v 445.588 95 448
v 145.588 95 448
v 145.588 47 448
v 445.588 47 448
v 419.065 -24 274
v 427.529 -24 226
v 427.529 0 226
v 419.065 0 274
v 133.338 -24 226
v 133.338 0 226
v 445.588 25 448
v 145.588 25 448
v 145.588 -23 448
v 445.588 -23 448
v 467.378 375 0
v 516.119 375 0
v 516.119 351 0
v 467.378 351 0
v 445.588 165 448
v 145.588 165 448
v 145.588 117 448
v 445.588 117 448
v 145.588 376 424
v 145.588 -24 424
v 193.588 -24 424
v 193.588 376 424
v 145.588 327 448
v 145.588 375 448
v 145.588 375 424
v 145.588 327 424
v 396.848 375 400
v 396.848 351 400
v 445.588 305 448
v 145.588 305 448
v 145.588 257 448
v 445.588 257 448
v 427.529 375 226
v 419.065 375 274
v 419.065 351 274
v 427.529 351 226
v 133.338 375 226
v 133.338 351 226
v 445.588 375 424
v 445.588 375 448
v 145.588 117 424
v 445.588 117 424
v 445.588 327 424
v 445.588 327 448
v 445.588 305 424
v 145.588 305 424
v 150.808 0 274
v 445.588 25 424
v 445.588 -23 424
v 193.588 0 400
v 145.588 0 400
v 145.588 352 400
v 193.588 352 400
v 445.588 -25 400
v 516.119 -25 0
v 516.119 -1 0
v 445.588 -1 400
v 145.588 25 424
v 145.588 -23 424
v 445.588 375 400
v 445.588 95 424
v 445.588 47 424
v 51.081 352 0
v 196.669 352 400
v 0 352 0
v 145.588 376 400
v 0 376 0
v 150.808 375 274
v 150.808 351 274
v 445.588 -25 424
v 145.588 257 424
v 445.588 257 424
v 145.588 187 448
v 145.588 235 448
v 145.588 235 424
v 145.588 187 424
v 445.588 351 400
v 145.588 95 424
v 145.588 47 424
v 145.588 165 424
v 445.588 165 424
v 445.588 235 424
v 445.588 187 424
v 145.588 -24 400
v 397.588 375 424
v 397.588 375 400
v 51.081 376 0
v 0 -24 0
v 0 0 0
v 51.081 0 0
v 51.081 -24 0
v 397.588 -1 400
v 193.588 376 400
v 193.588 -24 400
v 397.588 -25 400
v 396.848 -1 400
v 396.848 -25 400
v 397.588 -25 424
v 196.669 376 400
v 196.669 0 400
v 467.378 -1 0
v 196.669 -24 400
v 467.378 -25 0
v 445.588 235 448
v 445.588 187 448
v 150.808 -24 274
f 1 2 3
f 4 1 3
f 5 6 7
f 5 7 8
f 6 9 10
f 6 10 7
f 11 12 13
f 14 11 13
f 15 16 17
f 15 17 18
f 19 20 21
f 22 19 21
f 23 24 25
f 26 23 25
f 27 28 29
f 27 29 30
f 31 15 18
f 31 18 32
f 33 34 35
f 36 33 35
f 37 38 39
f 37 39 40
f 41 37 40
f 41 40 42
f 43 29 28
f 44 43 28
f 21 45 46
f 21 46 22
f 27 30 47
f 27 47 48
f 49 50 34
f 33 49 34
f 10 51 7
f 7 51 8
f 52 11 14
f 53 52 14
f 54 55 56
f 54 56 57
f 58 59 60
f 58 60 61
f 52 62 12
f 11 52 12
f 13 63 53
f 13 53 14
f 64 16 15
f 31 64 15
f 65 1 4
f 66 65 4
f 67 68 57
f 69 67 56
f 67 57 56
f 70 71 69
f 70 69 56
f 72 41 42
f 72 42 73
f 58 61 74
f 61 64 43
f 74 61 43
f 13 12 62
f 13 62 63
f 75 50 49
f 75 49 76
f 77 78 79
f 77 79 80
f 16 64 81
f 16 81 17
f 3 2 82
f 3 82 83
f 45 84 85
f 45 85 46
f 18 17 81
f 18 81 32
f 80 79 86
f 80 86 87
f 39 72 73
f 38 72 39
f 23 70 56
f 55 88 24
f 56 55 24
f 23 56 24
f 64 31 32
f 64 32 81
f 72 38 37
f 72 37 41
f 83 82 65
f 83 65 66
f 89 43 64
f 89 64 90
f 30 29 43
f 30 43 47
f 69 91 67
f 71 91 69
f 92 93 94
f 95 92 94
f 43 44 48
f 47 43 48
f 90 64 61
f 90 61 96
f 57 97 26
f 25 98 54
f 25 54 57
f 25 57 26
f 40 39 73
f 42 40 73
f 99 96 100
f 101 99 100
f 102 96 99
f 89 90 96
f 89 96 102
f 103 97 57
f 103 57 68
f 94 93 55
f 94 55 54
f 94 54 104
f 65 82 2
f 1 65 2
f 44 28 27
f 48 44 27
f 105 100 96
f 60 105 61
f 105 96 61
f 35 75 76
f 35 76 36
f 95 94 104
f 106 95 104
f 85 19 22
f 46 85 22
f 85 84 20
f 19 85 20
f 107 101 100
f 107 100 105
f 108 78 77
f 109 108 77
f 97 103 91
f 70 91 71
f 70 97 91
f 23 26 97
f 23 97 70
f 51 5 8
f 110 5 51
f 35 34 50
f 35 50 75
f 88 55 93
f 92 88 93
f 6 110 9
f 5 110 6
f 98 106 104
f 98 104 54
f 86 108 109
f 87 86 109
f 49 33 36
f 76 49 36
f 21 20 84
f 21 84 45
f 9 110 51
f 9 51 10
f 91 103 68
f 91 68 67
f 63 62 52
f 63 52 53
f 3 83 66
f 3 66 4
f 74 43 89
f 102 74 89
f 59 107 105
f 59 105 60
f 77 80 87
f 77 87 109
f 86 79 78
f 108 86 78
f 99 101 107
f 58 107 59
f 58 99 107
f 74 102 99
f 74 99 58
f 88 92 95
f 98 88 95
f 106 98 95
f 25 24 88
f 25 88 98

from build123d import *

# Parameters (mm, degrees)
F1_DEPTH  = 24
F2_W      = 48
F2_H      = 24
F3_DEPTH  = 400
F5_DEPTH  = 24
F6_W      = 48
F6_H      = 24
F7_DEPTH  = 300
F8_W      = 48
F8_H      = 24
F9_DEPTH  = 400
F11_DEPTH = 24
F13_DEPTH = 24
F15_DEPTH = 24
F17_DEPTH = 24


with BuildPart() as f1:
    # F0 (on Front) → F1 (new body)
    with BuildSketch(Plane.XZ):
        Polygon((145.588094, 400), (0, 0), (51.080533, 0), (196.668627, 400), align=None)
    extrude(amount=F1_DEPTH)

    # F2 (on face) → F3 (join)
    with BuildSketch(Plane.XZ.offset(24)):
        with Locations((169.588094, 412)):
            Rectangle(F2_W, F2_H)
    extrude(amount=-F3_DEPTH)

    # F4 (on face) → F5 (join)
    with BuildSketch(Plane(origin=(0, 376, 0), x_dir=(-1, 0, 0), z_dir=(0, 1, 0))):
        Polygon((-51.080533, 0), (0, 0), (-145.588094, 400), (-196.668627, 400), align=None)
    extrude(amount=-F5_DEPTH)


with BuildPart() as f7:
    # F6 (on face) → F7 (new body)
    with BuildSketch(Plane(origin=(145.588094, 0, 0), x_dir=(0, -1, 0), z_dir=(-1, 0, 0))):
        with Locations((-351, 436)):
            Rectangle(F6_W, F6_H)
        with Locations((-281, 436)):
            Rectangle(F6_W, F6_H)
        with Locations((-211, 436)):
            Rectangle(F6_W, F6_H)
        with Locations((-141, 436)):
            Rectangle(F6_W, F6_H)
        with Locations((-71, 436)):
            Rectangle(F6_W, F6_H)
        with Locations((-1, 436)):
            Rectangle(F6_W, F6_H)
    extrude(amount=-F7_DEPTH)


with BuildPart() as f9:
    # F8 (on face) → F9 (new body)
    with BuildSketch(Plane(origin=(0, 375, 0), x_dir=(-1, 0, 0), z_dir=(0, 1, 0))):
        with Locations((-421.588094, 412)):
            Rectangle(F8_W, F8_H)
    extrude(amount=-F9_DEPTH)

    # F12 (on face) → F13 (join)
    with BuildSketch(Plane.XZ.offset(25)):
        Polygon((516.118886, 0), (445.588094, 400), (396.847616, 400), (467.378409, 0), align=None)
    extrude(amount=-F13_DEPTH)


with BuildPart() as f11:
    # F10 (on face) → F11 (new body)
    with BuildSketch(Plane(origin=(0, 375, 0), x_dir=(-1, 0, 0), z_dir=(0, 1, 0))):
        Polygon((-396.847616, 400), (-445.588094, 400), (-516.118886, 0), (-467.378409, 0), align=None)
    extrude(amount=-F11_DEPTH)


with BuildPart() as f15:
    # F14 (on face) → F15 (new body)
    with BuildSketch(Plane.XZ.offset(24)):
        Polygon((133.337806, 226), (427.528511, 226), (419.064816, 274), (150.808377, 274), align=None)
    extrude(amount=-F15_DEPTH)


with BuildPart() as f17:
    # F16 (on face) → F17 (new body)
    with BuildSketch(Plane(origin=(0, 375, 0), x_dir=(-1, 0, 0), z_dir=(0, 1, 0))):
        Polygon((-133.337806, 226), (-150.808377, 274), (-419.064816, 274), (-427.528511, 226), align=None)
    extrude(amount=-F17_DEPTH)


solid = Compound([f1.part, f7.part, f9.part, f11.part, f15.part, f17.part])
